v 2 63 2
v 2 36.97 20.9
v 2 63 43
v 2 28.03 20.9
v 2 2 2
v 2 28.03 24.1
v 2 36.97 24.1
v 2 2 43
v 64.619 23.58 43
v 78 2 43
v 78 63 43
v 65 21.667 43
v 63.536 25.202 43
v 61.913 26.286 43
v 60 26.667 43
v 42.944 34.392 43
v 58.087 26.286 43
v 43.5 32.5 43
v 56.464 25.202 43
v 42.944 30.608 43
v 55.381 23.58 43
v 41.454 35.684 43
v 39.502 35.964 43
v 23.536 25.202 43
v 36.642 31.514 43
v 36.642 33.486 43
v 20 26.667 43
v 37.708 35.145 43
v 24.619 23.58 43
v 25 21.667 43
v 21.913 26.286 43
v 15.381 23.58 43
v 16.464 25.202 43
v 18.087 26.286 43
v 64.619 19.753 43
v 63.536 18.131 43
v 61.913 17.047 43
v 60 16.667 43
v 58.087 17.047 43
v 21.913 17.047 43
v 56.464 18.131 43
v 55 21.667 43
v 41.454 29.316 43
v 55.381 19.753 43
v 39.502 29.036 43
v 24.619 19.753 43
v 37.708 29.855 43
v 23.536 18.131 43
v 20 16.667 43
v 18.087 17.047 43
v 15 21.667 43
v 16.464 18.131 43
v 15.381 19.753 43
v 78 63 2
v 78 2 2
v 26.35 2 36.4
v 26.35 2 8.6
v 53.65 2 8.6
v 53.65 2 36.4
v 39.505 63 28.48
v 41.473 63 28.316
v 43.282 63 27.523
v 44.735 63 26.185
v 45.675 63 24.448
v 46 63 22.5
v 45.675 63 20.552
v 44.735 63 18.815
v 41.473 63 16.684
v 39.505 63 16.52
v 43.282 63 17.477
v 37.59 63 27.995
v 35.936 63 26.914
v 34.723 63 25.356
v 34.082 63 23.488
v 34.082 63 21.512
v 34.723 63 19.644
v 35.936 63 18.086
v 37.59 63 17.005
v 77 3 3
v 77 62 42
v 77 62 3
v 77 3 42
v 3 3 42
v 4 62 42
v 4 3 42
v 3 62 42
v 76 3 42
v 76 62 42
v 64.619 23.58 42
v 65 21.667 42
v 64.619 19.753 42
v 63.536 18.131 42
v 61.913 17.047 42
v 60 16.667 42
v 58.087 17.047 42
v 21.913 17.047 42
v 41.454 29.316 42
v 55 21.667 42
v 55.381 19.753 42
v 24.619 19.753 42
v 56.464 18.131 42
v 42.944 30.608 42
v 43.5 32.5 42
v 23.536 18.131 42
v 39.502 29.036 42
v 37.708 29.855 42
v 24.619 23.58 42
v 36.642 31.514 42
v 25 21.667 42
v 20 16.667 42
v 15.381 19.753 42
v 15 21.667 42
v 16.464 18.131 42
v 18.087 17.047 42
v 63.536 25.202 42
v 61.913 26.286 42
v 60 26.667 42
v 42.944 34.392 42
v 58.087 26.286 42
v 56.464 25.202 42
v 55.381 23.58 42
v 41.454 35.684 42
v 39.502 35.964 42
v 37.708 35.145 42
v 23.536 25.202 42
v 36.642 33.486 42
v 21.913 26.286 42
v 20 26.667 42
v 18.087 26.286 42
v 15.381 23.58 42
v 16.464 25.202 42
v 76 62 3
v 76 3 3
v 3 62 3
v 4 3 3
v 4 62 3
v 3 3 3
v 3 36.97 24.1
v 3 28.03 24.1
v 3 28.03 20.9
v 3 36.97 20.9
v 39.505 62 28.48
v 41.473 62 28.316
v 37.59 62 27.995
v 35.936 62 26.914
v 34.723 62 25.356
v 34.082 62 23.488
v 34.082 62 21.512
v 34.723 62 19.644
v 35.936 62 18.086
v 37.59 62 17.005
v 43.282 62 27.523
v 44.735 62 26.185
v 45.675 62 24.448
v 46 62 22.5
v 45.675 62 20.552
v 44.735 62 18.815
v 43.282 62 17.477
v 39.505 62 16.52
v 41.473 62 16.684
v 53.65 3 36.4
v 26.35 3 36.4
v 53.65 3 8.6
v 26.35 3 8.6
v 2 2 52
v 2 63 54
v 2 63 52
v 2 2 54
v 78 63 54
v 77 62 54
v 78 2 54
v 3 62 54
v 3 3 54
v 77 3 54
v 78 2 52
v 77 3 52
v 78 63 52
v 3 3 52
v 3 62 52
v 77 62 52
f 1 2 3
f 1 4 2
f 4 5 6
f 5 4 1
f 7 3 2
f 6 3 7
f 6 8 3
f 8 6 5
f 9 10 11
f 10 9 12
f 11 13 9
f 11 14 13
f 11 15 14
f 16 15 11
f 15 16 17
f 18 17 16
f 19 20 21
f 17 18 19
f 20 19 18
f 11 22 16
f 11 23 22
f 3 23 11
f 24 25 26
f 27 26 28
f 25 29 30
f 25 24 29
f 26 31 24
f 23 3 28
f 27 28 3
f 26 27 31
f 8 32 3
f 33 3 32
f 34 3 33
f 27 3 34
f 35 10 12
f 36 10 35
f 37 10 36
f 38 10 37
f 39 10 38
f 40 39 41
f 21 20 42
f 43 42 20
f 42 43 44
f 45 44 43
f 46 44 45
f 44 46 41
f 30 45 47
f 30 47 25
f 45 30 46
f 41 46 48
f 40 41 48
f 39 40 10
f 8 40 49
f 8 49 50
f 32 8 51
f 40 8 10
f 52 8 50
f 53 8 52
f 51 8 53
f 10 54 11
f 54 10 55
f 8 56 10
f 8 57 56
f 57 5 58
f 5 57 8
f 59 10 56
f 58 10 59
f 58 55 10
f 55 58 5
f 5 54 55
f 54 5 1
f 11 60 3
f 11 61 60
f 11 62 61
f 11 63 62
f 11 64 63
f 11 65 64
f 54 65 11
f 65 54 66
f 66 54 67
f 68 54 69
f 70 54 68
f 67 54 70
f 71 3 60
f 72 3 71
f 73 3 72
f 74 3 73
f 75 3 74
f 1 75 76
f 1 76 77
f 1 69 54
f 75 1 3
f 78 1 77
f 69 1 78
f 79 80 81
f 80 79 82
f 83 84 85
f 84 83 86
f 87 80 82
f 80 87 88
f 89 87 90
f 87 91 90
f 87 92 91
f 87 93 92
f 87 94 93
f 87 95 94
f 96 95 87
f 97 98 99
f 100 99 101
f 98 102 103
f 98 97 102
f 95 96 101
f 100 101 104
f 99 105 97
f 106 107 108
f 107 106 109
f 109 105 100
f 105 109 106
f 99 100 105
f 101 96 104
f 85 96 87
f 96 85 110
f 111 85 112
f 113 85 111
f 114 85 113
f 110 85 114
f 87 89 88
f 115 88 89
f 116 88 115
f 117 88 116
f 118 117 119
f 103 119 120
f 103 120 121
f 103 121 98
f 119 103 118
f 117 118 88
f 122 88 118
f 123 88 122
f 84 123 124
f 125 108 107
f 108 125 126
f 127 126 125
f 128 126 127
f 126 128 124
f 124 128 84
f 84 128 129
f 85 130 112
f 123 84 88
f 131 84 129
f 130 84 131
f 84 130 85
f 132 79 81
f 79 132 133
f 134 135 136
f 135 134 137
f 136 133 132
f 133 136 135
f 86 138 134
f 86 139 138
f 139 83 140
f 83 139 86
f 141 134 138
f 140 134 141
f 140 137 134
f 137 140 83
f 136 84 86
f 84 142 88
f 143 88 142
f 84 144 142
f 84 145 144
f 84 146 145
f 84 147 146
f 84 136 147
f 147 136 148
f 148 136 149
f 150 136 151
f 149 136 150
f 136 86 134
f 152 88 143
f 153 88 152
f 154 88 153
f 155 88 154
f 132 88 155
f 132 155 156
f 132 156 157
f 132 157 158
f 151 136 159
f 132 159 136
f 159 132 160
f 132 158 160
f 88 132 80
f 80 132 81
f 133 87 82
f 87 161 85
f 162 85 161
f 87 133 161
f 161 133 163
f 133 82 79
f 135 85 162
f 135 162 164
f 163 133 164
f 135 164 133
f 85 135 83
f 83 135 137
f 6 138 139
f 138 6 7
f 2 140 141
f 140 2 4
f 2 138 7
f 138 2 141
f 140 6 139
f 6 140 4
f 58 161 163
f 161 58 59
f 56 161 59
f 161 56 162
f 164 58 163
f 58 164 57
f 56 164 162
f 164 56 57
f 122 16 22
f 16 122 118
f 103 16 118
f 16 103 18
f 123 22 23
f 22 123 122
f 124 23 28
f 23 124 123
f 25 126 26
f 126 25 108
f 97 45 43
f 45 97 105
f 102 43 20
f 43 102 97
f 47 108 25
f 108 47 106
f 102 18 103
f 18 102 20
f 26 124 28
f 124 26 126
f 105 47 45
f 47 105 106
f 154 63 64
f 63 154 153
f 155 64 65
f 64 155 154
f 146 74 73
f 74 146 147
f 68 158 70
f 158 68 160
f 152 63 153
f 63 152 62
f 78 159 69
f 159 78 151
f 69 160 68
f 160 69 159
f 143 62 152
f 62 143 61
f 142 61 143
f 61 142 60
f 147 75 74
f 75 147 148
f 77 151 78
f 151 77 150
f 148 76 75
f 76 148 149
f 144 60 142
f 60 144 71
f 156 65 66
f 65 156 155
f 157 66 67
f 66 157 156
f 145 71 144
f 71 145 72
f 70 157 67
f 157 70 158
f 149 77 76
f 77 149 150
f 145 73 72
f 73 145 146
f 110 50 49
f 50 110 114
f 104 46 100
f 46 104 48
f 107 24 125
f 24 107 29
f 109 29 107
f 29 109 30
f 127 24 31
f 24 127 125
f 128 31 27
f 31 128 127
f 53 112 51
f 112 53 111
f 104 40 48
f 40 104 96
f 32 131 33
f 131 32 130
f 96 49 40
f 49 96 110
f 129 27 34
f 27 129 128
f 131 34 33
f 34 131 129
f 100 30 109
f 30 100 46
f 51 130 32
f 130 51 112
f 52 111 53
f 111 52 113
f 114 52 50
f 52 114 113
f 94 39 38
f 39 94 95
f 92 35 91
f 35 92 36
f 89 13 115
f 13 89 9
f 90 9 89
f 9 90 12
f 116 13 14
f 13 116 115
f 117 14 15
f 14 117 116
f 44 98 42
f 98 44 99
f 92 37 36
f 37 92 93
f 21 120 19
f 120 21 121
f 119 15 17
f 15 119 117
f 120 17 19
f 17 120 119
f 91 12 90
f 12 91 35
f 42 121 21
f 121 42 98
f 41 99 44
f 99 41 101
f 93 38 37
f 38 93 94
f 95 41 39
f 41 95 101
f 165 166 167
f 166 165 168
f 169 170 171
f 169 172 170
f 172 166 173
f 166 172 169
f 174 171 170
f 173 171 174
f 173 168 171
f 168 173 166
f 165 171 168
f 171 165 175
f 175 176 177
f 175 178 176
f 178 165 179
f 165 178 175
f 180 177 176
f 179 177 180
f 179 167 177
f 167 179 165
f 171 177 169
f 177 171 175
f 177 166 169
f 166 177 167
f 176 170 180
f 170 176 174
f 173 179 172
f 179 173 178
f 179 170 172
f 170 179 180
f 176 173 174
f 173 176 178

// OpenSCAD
// Puck — Desk Goblin (ACT Engine)
// Parametric enclosure for snap-in assembly
// JLC3DP MJF Nylon, green dye

// Parameters
engine = "ACT";
product = "Puck";
character = "goblin";
colour = "green";

// Electronics dimensions (fixed)
esp32_width = 25.8;
esp32_length = 50.8;
esp32_height = 3.6;
oled_width = 27.3;
oled_length = 27.8;
oled_height = 4;
encoder_diameter = 7;
buzzer_diameter = 12;

// Enclosure dimensions (within constraints)
width = 80;
length = 65;
height = 45;
wall = 2.0;

// Snap-fit rails
rail_depth = 2;
rail_lip = 1;

// USB-C port
usbc_width = 8.94;
usbc_height = 3.2;

// Character features
goblin_ear_height = 15;
goblin_ear_width = 10;
goblin_eye_diameter = 12;

// Main body
module goblin_body() {
    difference() {
        // Outer shell (rounded box)
        hull() {
            translate([wall, wall, wall])
                cube([width-2*wall, length-2*wall, height-2*wall]);
        }
        
        // Inner cavity
        translate([wall+rail_lip, wall+rail_lip, wall+rail_lip])
            cube([width-2*wall-2*rail_lip, length-2*wall-2*rail_lip, height-2*wall-2*rail_lip]);
        
        // USB-C port
        translate([-1, length/2-usbc_width/2, height/2-usbc_height/2])
            cube([wall+2, usbc_width, usbc_height]);
        
        // OLED window (front)
        translate([width/2-oled_width/2, -1, height/2-oled_length/2])
            cube([oled_width, wall+2, oled_length]);
        
        // Encoder knob (top)
        translate([width/2, length/2, height-wall-1])
            cylinder(d=encoder_diameter, h=wall+2);
        
        // Buzzer hole (back)
        translate([width/2, length+1, height/2])
            rotate([90, 0, 0])
                cylinder(d=buzzer_diameter, h=wall+2);
        
        // Goblin ears
        translate([width/4, length/3, height-wall-1])
            cylinder(d=goblin_ear_width, h=goblin_ear_height);
        translate([3*width/4, length/3, height-wall-1])
            cylinder(d=goblin_ear_width, h=goblin_ear_height);
        
        // Goblin eyes
        translate([width/3, -1, height/2])
            rotate([90, 0, 0])
                cylinder(d=goblin_eye_diameter, h=wall+2);
        translate([2*width/3, -1, height/2])
            rotate([90, 0, 0])
                cylinder(d=goblin_eye_diameter, h=wall+2);
    }
}

// Snap-fit rails
module snap_rails() {
    // Bottom rails
    translate([wall, wall, wall])
        cube([rail_depth, length-2*wall, rail_lip]);
    translate([width-wall-rail_depth, wall, wall])
        cube([rail_depth, length-2*wall, rail_lip]);
    
    // Top rails
    translate([wall, wall, height-wall-rail_lip])
        cube([rail_depth, length-2*wall, rail_lip]);
    translate([width-wall-rail_depth, wall, height-wall-rail_lip])
        cube([rail_depth, length-2*wall, rail_lip]);
}

// Lid
module goblin_lid() {
    difference() {
        // Outer shell
        hull() {
            translate([wall, wall, wall])
                cube([width-2*wall, length-2*wall, wall]);
        }
        
        // Inner cavity
        translate([wall+rail_lip, wall+rail_lip, wall])
            cube([width-2*wall-2*rail_lip, length-2*wall-2*rail_lip, wall]);
    }
}

// Assembly
module puck() {
    // Bottom half
    goblin_body();
    snap_rails();
    
    // Lid (offset for visualization)
    translate([0, 0, height+5])
        goblin_lid();
}

// Generate STL
puck();
